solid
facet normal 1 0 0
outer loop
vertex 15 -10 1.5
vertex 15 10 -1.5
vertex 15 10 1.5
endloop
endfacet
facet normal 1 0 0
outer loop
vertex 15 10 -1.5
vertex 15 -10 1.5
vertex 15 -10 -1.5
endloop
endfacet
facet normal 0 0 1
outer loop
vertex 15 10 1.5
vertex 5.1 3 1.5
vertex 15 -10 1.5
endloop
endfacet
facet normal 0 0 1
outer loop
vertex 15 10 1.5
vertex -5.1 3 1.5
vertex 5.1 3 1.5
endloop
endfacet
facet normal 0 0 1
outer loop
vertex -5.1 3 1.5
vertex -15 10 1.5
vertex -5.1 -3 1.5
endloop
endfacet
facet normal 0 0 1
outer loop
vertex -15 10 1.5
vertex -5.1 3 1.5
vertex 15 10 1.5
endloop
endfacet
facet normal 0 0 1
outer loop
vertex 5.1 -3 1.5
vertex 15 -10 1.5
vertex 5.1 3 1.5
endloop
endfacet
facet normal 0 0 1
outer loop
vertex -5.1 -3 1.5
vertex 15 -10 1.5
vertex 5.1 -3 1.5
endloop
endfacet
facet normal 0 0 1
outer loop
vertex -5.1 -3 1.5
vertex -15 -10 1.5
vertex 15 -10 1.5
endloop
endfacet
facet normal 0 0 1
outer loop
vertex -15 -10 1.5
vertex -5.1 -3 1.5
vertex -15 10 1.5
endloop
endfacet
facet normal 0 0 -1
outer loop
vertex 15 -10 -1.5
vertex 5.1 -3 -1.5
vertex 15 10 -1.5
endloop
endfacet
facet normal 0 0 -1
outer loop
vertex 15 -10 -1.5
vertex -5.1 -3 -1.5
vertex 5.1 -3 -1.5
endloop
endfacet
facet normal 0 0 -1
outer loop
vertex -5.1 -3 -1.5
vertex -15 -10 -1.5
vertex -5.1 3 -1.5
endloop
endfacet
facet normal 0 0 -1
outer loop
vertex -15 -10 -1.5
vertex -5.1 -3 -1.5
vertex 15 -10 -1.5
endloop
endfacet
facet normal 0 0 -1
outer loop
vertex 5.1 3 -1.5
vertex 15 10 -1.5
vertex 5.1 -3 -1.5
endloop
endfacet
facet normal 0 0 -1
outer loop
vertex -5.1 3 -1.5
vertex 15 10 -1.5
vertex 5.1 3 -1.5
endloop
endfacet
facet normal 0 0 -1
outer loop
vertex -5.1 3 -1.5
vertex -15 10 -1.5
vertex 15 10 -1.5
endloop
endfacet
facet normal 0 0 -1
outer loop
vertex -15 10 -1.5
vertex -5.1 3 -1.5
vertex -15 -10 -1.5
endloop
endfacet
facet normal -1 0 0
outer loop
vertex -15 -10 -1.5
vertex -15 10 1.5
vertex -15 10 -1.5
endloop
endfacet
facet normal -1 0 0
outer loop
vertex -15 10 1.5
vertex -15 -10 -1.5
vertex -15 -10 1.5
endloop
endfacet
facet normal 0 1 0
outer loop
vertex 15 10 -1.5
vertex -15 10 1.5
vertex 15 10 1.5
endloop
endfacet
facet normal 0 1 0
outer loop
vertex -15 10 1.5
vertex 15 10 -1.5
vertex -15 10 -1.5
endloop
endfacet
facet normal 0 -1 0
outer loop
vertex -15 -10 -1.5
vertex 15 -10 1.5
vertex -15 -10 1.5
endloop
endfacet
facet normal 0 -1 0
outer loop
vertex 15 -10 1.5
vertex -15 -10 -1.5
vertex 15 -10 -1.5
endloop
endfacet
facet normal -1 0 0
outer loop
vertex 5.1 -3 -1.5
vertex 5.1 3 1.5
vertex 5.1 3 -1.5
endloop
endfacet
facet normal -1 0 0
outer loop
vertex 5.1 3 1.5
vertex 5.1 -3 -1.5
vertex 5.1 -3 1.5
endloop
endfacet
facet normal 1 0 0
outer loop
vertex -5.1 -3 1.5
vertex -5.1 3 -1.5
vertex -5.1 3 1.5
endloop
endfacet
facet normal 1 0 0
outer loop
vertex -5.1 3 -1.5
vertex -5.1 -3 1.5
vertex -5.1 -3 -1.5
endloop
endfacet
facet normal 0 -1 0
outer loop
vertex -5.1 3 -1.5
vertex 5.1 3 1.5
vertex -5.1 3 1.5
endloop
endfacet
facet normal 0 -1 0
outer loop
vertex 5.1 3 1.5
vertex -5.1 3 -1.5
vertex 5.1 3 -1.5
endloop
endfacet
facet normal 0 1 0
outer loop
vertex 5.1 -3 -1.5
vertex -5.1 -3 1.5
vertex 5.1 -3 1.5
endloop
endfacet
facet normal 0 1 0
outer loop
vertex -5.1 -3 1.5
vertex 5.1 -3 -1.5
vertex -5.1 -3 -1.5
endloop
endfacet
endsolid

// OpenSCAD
// Units: mm. CAD-only example; not a validated fit.
slot_width=10.2;
difference(){ cube([30,20,3],center=true); cube([slot_width,6,5],center=true); }
